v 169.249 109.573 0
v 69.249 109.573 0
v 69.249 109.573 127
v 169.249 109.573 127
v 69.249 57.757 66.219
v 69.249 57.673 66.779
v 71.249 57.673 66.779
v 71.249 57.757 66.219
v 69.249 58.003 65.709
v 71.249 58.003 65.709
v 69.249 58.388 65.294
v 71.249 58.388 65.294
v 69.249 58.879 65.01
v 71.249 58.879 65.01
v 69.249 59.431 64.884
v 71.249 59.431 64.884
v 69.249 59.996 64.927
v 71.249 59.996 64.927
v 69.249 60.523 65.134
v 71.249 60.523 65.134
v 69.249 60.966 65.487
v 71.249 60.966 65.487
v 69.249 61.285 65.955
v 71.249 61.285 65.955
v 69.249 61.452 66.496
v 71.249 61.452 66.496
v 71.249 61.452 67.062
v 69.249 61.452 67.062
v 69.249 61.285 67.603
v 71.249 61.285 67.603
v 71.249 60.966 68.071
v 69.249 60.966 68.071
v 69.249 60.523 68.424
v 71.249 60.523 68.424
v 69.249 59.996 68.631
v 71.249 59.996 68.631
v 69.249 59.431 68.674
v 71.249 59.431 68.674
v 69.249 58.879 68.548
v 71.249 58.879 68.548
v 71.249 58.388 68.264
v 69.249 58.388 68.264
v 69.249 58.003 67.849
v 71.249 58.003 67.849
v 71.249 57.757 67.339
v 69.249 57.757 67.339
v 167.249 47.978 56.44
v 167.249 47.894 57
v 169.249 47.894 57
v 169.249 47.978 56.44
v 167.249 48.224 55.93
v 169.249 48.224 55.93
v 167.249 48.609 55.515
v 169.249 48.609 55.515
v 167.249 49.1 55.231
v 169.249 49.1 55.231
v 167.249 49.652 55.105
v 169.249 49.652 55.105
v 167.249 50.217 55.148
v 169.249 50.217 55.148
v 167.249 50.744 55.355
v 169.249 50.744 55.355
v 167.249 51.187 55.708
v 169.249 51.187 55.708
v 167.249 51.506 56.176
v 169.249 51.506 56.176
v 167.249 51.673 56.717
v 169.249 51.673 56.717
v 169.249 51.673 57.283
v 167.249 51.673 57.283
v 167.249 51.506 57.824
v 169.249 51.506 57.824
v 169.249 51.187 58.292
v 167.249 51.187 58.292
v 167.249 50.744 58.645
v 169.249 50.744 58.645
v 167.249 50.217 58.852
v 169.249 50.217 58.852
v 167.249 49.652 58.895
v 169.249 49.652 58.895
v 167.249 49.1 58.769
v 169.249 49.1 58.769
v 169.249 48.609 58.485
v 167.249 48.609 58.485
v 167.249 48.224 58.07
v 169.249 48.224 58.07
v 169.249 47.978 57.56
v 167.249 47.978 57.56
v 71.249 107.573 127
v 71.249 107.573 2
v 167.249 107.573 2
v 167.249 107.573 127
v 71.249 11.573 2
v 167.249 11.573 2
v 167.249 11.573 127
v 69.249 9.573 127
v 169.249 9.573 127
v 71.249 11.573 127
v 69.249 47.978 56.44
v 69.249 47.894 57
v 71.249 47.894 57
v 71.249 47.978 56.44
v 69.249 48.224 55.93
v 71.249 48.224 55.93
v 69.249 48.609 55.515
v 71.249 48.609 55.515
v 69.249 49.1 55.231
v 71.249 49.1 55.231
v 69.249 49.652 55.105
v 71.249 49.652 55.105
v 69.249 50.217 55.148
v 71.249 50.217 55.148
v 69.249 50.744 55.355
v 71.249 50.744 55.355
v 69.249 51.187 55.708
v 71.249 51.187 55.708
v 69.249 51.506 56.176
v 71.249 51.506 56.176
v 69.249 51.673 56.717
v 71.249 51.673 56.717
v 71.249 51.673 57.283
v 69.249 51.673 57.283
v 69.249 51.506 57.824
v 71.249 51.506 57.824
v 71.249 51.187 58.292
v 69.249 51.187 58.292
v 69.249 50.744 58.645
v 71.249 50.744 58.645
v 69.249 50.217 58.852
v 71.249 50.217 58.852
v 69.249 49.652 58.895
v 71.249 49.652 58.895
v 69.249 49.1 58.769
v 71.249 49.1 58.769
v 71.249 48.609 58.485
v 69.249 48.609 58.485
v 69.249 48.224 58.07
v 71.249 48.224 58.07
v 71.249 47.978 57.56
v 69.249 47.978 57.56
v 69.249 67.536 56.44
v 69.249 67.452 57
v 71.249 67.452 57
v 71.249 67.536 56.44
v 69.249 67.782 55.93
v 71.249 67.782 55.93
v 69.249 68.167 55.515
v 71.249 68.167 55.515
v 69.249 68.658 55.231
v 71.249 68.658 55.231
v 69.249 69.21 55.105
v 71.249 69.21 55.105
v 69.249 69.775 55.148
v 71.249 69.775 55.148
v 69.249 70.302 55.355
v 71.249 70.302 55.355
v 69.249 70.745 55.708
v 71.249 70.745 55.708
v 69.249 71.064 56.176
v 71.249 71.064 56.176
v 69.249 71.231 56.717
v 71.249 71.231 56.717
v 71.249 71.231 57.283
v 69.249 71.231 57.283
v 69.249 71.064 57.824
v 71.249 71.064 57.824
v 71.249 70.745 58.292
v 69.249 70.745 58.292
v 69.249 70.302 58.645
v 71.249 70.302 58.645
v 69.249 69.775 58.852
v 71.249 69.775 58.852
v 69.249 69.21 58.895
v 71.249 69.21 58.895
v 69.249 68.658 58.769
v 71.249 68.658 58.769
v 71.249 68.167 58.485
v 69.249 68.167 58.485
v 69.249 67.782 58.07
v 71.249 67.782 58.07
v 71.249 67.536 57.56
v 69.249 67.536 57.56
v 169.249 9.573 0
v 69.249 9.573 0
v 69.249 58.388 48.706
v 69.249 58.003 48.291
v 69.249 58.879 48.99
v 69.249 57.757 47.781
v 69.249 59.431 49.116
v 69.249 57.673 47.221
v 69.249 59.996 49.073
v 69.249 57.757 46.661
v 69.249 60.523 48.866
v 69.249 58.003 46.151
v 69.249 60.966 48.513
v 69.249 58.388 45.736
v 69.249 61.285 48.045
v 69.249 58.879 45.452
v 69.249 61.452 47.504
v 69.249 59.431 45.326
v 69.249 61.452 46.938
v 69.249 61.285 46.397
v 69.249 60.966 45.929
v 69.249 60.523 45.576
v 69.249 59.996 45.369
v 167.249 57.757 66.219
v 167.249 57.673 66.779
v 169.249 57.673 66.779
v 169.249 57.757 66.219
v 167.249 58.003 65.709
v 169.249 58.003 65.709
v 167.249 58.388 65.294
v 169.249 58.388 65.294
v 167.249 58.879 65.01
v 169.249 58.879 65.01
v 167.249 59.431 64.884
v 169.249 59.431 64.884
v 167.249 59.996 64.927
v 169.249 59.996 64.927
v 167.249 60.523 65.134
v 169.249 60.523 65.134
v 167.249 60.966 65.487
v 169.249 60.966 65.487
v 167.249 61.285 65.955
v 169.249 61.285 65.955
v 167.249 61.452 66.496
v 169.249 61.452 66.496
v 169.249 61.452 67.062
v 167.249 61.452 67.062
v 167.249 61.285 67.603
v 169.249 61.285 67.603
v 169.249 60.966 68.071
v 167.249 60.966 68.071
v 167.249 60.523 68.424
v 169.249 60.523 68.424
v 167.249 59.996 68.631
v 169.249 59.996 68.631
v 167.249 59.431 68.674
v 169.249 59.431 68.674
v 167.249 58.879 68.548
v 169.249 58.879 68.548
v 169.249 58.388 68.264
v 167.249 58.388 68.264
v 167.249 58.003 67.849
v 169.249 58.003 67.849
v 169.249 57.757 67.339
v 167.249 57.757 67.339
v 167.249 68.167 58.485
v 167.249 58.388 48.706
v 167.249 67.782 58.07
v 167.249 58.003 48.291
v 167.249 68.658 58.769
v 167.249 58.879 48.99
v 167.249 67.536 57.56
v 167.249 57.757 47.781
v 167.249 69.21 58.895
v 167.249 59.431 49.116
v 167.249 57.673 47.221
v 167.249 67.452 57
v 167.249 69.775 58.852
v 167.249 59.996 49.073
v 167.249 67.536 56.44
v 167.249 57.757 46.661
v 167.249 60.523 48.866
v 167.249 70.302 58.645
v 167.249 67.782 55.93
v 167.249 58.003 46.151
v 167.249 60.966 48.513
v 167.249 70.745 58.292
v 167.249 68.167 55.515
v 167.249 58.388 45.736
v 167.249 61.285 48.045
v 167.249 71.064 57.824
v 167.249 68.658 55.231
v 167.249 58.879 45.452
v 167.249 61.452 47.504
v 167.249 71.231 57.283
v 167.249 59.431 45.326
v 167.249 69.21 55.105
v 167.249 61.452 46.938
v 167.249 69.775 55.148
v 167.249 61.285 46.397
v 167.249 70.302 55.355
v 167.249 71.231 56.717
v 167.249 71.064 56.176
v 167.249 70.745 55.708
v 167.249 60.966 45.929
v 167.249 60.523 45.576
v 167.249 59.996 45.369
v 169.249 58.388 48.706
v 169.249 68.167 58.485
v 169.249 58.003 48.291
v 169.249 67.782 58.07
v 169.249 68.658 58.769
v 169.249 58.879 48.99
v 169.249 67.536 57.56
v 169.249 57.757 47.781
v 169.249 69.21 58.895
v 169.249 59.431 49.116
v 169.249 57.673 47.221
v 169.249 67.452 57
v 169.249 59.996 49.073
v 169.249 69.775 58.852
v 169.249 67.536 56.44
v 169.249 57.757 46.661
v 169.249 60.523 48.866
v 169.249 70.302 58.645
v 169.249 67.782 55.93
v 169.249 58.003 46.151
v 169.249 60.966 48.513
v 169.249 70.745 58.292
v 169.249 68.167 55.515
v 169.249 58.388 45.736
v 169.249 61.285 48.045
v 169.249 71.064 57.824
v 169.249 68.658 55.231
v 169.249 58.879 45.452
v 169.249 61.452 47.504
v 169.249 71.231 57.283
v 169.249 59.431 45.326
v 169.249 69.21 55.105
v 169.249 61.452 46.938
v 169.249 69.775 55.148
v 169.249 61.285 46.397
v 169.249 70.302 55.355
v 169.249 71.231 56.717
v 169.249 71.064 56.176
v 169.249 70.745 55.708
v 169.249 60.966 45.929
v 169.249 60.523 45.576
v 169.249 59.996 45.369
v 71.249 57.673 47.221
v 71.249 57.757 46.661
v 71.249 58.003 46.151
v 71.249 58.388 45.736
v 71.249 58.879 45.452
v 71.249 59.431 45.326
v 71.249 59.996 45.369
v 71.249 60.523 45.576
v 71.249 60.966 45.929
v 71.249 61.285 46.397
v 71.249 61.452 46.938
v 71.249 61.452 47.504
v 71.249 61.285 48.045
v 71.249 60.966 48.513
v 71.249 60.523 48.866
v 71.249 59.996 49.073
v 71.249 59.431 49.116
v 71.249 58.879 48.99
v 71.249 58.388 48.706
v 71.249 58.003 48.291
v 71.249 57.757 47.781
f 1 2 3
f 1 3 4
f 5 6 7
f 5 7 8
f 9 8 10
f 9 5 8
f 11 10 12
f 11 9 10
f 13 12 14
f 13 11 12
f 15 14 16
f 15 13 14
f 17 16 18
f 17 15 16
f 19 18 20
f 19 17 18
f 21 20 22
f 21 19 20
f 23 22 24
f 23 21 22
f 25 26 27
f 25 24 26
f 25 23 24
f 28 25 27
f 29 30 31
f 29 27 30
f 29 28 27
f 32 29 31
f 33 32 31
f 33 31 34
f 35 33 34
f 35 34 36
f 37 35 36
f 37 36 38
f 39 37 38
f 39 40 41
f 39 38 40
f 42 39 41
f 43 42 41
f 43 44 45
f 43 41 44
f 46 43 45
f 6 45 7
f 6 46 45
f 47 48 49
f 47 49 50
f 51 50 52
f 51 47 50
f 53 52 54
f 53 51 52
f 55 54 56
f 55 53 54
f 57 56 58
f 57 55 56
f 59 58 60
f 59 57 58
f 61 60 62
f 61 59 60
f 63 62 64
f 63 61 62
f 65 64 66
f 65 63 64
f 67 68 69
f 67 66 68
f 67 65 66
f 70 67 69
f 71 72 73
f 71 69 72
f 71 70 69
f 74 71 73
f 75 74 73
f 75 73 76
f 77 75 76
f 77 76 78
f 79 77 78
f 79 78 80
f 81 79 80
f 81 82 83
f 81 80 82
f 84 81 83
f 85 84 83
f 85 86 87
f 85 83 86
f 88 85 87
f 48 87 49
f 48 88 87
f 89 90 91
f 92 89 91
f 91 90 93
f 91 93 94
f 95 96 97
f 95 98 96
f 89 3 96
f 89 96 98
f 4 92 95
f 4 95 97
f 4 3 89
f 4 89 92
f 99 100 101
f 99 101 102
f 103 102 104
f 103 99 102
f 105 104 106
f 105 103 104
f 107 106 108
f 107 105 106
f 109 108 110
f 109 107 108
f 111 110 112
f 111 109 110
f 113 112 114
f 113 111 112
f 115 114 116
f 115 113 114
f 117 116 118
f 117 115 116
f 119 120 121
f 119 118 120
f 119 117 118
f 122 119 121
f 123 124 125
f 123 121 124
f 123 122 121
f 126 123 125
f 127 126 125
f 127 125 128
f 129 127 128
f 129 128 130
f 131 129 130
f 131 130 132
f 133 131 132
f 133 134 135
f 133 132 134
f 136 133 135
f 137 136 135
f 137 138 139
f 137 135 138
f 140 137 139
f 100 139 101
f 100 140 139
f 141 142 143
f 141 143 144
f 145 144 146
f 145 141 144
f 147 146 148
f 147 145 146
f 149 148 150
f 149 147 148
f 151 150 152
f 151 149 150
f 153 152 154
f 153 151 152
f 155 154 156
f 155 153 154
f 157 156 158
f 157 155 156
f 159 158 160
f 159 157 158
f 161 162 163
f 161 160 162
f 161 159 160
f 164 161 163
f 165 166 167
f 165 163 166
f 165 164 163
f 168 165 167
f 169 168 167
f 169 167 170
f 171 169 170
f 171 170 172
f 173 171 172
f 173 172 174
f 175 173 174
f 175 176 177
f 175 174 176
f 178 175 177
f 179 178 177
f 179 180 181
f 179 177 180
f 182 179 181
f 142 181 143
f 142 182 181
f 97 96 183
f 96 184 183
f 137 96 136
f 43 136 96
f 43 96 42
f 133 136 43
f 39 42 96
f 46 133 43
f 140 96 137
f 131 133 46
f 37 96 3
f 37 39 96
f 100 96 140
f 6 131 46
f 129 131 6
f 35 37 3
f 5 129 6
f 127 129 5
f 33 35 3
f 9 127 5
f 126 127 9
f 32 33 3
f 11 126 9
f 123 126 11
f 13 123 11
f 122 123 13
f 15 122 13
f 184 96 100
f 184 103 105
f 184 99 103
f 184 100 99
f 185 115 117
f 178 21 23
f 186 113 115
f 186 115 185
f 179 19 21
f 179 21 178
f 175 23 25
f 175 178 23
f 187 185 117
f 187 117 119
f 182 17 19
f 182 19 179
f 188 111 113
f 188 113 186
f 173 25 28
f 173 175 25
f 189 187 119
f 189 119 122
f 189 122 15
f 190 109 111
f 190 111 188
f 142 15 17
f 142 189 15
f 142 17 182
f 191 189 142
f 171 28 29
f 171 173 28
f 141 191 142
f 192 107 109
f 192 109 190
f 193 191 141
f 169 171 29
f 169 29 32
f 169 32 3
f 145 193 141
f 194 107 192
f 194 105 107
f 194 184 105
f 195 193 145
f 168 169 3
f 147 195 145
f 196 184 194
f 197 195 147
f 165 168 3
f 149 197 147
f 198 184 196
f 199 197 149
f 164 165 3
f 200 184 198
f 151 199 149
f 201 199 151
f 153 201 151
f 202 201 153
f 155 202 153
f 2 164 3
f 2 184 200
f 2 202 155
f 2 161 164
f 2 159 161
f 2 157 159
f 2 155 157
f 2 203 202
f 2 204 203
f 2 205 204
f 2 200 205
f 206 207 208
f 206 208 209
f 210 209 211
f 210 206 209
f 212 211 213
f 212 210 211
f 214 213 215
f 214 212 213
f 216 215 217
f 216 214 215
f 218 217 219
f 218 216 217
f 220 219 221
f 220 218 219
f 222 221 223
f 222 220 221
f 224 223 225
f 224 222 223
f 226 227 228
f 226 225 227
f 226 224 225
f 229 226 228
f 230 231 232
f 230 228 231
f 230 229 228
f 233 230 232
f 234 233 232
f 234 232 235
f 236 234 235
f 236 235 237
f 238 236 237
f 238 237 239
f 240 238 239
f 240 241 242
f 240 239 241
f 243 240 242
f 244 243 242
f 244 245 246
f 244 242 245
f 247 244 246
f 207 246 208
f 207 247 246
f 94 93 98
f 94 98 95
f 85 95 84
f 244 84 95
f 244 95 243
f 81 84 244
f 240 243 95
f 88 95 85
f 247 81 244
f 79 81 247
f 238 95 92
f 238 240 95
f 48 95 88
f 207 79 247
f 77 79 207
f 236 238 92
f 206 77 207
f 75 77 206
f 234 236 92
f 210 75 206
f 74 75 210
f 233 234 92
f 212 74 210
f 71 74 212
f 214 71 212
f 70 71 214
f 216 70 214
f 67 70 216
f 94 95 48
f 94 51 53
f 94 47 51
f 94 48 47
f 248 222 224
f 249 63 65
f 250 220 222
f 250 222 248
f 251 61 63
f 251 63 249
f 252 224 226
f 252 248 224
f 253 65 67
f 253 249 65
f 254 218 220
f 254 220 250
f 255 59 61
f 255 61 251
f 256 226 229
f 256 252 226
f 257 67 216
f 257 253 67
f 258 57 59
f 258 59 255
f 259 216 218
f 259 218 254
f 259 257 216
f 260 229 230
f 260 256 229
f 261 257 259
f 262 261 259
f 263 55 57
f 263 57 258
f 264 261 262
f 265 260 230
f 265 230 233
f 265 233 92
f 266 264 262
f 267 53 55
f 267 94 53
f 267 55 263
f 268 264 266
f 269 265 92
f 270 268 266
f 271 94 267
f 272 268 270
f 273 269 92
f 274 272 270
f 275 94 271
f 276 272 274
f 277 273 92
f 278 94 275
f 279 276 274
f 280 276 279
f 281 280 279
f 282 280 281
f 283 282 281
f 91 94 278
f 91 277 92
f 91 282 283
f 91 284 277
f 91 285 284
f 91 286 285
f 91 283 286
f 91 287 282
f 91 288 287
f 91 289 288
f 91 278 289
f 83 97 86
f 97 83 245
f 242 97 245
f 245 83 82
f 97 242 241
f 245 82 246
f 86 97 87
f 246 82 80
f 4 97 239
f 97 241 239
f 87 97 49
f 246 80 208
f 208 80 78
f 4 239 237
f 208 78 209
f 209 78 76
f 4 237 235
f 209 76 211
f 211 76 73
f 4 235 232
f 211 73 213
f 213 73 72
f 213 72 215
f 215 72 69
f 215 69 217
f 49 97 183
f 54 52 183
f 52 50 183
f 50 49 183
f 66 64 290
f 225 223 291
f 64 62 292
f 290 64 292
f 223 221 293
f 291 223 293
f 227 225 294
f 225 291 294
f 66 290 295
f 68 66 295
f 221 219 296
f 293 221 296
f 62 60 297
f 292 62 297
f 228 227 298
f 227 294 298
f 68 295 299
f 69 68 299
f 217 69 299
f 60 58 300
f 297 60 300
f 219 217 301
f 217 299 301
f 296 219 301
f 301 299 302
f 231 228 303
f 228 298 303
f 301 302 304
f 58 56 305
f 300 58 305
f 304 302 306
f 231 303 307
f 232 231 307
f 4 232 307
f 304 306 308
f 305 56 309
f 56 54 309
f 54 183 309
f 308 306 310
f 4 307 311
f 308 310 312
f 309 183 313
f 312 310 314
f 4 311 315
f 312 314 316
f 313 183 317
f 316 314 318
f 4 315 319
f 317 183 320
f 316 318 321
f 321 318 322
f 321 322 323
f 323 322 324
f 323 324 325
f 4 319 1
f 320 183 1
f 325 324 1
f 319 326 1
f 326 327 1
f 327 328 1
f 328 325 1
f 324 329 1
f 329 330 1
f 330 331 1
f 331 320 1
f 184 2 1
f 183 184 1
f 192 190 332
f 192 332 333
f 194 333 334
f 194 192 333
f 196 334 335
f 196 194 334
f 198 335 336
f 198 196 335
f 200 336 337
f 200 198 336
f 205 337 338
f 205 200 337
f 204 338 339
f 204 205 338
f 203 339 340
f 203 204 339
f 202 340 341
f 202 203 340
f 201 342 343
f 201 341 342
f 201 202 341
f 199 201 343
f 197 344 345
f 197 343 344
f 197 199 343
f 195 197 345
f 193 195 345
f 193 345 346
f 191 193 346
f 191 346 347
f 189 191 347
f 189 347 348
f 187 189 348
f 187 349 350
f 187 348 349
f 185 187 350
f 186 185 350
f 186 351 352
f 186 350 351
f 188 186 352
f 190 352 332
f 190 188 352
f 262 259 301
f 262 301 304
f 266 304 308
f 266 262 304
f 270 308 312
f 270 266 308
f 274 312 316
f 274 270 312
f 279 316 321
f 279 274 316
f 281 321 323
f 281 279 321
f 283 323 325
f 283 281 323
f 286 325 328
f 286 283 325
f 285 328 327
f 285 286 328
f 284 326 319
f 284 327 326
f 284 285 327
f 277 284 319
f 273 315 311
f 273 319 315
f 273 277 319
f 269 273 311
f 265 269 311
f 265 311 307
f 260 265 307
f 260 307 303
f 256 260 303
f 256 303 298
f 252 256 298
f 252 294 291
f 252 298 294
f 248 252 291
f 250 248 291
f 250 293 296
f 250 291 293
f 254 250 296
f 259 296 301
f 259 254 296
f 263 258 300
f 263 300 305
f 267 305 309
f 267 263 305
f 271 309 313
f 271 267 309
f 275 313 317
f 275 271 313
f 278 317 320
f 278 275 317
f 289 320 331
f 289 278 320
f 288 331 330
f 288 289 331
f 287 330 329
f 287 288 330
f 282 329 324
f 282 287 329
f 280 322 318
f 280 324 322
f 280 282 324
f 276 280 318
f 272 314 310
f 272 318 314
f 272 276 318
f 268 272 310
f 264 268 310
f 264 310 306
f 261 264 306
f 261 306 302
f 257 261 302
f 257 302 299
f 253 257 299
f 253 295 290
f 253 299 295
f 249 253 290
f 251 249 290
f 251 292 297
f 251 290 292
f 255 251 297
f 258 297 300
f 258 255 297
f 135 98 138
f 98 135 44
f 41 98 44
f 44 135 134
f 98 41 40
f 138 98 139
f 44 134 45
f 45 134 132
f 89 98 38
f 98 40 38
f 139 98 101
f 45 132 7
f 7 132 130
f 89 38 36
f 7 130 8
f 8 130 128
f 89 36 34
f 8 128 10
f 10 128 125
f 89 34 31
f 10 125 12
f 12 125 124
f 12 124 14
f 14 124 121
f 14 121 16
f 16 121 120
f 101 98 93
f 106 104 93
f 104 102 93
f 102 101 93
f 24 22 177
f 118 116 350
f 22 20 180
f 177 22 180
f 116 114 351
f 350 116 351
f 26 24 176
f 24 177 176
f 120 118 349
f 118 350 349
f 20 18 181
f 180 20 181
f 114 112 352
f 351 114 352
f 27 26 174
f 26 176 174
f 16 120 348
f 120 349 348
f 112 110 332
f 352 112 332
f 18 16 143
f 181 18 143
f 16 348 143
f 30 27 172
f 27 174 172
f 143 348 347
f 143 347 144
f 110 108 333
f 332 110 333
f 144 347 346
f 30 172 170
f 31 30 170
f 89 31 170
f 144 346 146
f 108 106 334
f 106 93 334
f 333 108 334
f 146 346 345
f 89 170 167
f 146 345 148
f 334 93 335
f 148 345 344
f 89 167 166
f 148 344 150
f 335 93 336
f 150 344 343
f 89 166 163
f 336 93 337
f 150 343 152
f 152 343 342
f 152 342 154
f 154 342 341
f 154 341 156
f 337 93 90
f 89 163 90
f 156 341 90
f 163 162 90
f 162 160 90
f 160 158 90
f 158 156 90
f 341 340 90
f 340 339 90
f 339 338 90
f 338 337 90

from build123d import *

# Parameters (mm, degrees)
SKETCH1_W               = 100
SKETCH1_H               = 100
BOSS_EXTRUDE2_DEPTH     = 2
SKETCH2_W               = 100
SKETCH2_H               = 100
SKETCH2_W_2             = 96
SKETCH2_H_2             = 96
BOSS_EXTRUDE4_DEPTH     = 125
CUT_EXTRUDE1_DEPTH      = 196.282511518
CUT_EXTRUDE1_DEPTH_BACK = 196.282511518
SKETCH3_R               = 1.9


with BuildPart() as part:
    # Sketch1 → Boss-Extrude2 (new body)
    with BuildSketch(Plane.XY):
        with Locations((119.248829914, 59.573077464)):
            Rectangle(SKETCH1_W, SKETCH1_H)
    extrude(amount=BOSS_EXTRUDE2_DEPTH)

    # Sketch2 → Boss-Extrude4 (add)
    with BuildSketch(Plane.XY.offset(2)):
        with Locations((119.248829914, 59.573077464)):
            Rectangle(SKETCH2_W, SKETCH2_H)
        with Locations((119.248829914, 59.573077464)):
            Rectangle(SKETCH2_W_2, SKETCH2_H_2, mode=Mode.SUBTRACT)
    extrude(amount=BOSS_EXTRUDE4_DEPTH)

    # Sketch3 → Cut-Extrude1 (cut, two sides: drawn at the far end of the back side and taken through both)
    with BuildSketch(Plane(origin=(169.248829914, 0, 0), x_dir=(0, 0, -1), z_dir=(1, 0, 0)).offset(-CUT_EXTRUDE1_DEPTH_BACK)):
        with Locations(Location((-57, 69.352077464, 0), (0, 0, 270))):
            Circle(SKETCH3_R)
        with Locations(Location((-47.221, 59.573077464, 0), (0, 0, 270))):
            Circle(SKETCH3_R)
        with Locations(Location((-57, 49.794077464, 0), (0, 0, 270))):
            Circle(SKETCH3_R)
        with Locations(Location((-66.779, 59.573077464, 0), (0, 0, 270))):
            Circle(SKETCH3_R)
    extrude(amount=CUT_EXTRUDE1_DEPTH + CUT_EXTRUDE1_DEPTH_BACK, mode=Mode.SUBTRACT)


solid = part.part
